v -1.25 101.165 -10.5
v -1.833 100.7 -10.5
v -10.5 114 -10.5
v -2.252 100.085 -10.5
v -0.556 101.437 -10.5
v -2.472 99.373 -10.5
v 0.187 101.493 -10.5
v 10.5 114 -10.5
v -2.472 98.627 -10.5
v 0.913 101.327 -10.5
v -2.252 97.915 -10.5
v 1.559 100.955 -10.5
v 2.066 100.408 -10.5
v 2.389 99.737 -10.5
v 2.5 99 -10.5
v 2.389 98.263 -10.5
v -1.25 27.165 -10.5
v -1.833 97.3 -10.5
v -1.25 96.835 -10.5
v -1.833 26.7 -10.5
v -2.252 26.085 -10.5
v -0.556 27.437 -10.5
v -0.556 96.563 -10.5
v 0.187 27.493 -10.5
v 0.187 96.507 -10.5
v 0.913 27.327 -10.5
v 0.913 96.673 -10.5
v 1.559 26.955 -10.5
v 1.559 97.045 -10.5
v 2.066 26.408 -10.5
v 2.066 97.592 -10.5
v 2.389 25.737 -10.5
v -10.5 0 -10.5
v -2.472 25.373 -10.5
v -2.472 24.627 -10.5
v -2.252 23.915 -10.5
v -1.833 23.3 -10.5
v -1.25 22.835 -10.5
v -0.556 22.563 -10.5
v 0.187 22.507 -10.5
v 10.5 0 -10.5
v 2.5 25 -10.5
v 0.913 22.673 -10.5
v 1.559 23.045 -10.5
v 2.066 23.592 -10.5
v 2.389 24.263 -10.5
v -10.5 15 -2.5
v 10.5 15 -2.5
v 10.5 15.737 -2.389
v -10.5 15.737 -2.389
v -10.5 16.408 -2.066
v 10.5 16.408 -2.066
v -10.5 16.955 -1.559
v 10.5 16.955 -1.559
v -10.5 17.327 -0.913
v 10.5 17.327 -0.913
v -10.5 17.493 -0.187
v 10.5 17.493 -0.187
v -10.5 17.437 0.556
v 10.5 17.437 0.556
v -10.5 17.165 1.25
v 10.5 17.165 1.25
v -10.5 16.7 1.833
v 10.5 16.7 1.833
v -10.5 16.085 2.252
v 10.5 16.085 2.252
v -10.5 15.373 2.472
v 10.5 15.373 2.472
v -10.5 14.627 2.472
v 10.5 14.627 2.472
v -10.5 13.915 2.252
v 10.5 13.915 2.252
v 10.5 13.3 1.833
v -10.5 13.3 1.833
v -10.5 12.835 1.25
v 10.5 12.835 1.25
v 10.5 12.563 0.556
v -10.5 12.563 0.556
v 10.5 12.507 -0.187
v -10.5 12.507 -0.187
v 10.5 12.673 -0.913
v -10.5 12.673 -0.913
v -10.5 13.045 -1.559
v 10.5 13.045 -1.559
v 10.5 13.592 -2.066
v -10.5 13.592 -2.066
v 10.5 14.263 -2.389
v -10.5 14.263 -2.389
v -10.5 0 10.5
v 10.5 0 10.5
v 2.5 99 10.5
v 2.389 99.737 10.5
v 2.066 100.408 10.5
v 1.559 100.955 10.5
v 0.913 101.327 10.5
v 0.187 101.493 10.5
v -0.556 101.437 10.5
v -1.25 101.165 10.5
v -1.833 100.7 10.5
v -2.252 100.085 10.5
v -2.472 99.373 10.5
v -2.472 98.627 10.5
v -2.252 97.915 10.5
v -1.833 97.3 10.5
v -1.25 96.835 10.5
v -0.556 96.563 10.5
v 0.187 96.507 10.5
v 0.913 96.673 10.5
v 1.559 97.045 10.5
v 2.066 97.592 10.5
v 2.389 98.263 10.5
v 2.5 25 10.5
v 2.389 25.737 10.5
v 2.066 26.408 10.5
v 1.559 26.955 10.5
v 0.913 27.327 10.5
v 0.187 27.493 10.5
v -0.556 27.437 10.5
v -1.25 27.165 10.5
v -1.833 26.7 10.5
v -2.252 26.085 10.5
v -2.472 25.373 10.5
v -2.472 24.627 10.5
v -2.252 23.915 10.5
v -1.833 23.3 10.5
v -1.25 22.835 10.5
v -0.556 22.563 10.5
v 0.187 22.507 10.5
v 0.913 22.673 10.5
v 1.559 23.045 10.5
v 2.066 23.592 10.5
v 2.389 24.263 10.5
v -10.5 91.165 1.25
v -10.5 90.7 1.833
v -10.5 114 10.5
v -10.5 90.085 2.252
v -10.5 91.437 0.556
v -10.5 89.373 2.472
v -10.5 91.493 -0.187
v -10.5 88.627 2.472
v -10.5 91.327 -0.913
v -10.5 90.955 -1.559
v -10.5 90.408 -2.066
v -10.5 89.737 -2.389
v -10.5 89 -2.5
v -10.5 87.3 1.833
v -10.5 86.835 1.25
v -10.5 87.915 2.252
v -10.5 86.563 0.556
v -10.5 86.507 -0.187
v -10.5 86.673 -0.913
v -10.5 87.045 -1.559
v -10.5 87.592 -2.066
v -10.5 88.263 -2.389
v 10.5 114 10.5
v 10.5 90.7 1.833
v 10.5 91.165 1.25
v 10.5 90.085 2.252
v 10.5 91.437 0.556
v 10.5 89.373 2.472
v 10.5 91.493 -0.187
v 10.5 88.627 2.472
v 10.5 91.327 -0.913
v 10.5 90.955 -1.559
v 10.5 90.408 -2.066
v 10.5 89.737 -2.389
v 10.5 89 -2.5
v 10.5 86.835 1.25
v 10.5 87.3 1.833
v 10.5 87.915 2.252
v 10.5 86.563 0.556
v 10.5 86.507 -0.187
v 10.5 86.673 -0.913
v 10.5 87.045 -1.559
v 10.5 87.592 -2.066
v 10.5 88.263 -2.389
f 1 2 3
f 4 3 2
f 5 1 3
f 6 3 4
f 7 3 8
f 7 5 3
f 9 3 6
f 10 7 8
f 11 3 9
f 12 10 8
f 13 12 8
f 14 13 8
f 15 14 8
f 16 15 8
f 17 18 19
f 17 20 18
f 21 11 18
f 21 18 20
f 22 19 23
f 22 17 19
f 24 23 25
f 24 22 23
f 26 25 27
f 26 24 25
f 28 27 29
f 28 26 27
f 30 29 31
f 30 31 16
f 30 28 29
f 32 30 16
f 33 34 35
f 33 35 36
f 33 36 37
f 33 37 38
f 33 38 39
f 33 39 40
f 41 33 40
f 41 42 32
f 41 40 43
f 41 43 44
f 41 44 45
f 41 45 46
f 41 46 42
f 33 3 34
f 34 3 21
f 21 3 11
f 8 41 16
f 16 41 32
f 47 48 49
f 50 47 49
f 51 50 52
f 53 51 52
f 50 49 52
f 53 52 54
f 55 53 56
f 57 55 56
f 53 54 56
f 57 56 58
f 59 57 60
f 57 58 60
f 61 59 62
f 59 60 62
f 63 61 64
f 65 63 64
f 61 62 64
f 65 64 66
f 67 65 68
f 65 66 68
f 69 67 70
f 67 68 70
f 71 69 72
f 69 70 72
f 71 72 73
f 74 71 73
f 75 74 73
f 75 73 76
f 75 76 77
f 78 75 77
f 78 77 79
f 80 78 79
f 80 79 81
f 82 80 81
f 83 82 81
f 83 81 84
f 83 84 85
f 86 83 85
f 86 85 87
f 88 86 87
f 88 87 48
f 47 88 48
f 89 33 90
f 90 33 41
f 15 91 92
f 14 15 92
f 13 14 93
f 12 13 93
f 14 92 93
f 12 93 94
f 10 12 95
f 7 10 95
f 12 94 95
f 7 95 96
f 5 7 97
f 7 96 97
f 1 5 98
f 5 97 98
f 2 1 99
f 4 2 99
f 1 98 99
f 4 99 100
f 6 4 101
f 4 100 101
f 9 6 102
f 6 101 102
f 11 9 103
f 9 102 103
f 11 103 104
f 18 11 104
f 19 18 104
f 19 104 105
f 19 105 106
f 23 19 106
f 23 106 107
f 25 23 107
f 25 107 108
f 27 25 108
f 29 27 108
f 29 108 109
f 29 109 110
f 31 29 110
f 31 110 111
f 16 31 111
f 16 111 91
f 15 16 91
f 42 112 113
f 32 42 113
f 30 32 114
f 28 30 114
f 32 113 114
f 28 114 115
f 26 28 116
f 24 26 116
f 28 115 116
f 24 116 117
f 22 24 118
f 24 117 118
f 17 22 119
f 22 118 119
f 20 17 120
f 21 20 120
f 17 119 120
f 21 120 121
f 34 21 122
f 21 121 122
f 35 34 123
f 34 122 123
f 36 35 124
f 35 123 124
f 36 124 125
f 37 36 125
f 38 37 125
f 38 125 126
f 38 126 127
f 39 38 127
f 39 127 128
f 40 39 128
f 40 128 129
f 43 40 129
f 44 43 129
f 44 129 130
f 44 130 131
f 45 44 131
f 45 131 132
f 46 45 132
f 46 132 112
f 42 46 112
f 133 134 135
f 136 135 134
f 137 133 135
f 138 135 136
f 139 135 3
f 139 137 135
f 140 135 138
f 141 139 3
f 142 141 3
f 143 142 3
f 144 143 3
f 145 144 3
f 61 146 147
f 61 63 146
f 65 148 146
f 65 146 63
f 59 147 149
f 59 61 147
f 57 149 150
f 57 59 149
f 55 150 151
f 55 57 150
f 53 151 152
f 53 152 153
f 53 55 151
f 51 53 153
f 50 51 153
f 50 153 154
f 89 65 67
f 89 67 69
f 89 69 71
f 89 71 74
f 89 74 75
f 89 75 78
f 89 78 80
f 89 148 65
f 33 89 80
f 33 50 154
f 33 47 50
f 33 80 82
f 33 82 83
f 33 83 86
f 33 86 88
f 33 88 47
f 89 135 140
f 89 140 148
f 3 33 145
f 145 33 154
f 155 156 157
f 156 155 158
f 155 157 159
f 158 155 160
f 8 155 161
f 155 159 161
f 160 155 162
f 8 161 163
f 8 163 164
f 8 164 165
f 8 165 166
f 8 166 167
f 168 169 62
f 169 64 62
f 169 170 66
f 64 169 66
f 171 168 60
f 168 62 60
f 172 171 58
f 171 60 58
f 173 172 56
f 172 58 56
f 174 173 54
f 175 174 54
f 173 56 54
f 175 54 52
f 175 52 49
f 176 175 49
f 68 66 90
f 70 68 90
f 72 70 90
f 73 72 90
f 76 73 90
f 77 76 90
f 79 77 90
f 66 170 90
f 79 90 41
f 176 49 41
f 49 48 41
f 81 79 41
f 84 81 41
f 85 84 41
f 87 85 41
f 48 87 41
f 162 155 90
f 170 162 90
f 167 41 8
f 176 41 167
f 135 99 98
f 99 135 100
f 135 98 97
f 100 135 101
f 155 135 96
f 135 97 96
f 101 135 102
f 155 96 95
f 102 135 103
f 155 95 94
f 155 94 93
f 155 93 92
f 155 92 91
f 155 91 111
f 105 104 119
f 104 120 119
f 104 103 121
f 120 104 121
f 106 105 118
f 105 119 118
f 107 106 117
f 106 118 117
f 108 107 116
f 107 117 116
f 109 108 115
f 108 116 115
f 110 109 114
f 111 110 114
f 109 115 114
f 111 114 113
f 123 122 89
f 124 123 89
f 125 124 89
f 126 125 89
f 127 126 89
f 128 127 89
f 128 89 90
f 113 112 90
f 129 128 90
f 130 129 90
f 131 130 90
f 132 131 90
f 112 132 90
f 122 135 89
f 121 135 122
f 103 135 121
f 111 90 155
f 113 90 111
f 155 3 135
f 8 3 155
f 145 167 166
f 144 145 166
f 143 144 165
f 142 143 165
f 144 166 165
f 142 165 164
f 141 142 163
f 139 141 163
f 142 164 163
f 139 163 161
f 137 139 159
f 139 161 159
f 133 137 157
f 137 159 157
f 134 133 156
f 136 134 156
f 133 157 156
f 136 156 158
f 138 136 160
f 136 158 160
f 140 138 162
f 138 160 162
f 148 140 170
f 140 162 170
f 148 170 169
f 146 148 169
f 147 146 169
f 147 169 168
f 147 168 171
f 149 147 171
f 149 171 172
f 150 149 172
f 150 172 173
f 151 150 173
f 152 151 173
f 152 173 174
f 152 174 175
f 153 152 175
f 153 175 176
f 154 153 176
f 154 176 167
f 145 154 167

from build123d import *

# Parameters (mm, degrees)
SKETCH1_W           = 21
SKETCH1_H           = 21
BOSS_EXTRUDE1_DEPTH = 114
SKETCH3_R           = 2.5
CUT_EXTRUDE1_DEPTH  = 117.392654407
SKETCH4_R           = 2.5
CUT_EXTRUDE2_DEPTH  = 117.392654407


with BuildPart() as part:
    # Sketch1 → Boss-Extrude1 (new body)
    with BuildSketch(Plane(origin=(0, 0, 0), x_dir=(1, 0, 0), z_dir=(0, 1, 0))):
        Rectangle(SKETCH1_W, SKETCH1_H)
    extrude(amount=BOSS_EXTRUDE1_DEPTH)

    # Sketch3 → Cut-Extrude1 (cut, through all)
    with BuildSketch(Plane.XY.offset(10.5)):
        with Locations((0, 99)):
            Circle(SKETCH3_R)
        with Locations((0, 25)):
            Circle(SKETCH3_R)
    extrude(amount=-CUT_EXTRUDE1_DEPTH, mode=Mode.SUBTRACT)

    # Sketch4 → Cut-Extrude2 (cut, through all)
    with BuildSketch(Plane(origin=(10.5, 0, 0), x_dir=(0, 0, -1), z_dir=(1, 0, 0))):
        with Locations((0, 89)):
            Circle(SKETCH4_R)
        with Locations((0, 15)):
            Circle(SKETCH4_R)
    extrude(amount=-CUT_EXTRUDE2_DEPTH, mode=Mode.SUBTRACT)


solid = part.part
